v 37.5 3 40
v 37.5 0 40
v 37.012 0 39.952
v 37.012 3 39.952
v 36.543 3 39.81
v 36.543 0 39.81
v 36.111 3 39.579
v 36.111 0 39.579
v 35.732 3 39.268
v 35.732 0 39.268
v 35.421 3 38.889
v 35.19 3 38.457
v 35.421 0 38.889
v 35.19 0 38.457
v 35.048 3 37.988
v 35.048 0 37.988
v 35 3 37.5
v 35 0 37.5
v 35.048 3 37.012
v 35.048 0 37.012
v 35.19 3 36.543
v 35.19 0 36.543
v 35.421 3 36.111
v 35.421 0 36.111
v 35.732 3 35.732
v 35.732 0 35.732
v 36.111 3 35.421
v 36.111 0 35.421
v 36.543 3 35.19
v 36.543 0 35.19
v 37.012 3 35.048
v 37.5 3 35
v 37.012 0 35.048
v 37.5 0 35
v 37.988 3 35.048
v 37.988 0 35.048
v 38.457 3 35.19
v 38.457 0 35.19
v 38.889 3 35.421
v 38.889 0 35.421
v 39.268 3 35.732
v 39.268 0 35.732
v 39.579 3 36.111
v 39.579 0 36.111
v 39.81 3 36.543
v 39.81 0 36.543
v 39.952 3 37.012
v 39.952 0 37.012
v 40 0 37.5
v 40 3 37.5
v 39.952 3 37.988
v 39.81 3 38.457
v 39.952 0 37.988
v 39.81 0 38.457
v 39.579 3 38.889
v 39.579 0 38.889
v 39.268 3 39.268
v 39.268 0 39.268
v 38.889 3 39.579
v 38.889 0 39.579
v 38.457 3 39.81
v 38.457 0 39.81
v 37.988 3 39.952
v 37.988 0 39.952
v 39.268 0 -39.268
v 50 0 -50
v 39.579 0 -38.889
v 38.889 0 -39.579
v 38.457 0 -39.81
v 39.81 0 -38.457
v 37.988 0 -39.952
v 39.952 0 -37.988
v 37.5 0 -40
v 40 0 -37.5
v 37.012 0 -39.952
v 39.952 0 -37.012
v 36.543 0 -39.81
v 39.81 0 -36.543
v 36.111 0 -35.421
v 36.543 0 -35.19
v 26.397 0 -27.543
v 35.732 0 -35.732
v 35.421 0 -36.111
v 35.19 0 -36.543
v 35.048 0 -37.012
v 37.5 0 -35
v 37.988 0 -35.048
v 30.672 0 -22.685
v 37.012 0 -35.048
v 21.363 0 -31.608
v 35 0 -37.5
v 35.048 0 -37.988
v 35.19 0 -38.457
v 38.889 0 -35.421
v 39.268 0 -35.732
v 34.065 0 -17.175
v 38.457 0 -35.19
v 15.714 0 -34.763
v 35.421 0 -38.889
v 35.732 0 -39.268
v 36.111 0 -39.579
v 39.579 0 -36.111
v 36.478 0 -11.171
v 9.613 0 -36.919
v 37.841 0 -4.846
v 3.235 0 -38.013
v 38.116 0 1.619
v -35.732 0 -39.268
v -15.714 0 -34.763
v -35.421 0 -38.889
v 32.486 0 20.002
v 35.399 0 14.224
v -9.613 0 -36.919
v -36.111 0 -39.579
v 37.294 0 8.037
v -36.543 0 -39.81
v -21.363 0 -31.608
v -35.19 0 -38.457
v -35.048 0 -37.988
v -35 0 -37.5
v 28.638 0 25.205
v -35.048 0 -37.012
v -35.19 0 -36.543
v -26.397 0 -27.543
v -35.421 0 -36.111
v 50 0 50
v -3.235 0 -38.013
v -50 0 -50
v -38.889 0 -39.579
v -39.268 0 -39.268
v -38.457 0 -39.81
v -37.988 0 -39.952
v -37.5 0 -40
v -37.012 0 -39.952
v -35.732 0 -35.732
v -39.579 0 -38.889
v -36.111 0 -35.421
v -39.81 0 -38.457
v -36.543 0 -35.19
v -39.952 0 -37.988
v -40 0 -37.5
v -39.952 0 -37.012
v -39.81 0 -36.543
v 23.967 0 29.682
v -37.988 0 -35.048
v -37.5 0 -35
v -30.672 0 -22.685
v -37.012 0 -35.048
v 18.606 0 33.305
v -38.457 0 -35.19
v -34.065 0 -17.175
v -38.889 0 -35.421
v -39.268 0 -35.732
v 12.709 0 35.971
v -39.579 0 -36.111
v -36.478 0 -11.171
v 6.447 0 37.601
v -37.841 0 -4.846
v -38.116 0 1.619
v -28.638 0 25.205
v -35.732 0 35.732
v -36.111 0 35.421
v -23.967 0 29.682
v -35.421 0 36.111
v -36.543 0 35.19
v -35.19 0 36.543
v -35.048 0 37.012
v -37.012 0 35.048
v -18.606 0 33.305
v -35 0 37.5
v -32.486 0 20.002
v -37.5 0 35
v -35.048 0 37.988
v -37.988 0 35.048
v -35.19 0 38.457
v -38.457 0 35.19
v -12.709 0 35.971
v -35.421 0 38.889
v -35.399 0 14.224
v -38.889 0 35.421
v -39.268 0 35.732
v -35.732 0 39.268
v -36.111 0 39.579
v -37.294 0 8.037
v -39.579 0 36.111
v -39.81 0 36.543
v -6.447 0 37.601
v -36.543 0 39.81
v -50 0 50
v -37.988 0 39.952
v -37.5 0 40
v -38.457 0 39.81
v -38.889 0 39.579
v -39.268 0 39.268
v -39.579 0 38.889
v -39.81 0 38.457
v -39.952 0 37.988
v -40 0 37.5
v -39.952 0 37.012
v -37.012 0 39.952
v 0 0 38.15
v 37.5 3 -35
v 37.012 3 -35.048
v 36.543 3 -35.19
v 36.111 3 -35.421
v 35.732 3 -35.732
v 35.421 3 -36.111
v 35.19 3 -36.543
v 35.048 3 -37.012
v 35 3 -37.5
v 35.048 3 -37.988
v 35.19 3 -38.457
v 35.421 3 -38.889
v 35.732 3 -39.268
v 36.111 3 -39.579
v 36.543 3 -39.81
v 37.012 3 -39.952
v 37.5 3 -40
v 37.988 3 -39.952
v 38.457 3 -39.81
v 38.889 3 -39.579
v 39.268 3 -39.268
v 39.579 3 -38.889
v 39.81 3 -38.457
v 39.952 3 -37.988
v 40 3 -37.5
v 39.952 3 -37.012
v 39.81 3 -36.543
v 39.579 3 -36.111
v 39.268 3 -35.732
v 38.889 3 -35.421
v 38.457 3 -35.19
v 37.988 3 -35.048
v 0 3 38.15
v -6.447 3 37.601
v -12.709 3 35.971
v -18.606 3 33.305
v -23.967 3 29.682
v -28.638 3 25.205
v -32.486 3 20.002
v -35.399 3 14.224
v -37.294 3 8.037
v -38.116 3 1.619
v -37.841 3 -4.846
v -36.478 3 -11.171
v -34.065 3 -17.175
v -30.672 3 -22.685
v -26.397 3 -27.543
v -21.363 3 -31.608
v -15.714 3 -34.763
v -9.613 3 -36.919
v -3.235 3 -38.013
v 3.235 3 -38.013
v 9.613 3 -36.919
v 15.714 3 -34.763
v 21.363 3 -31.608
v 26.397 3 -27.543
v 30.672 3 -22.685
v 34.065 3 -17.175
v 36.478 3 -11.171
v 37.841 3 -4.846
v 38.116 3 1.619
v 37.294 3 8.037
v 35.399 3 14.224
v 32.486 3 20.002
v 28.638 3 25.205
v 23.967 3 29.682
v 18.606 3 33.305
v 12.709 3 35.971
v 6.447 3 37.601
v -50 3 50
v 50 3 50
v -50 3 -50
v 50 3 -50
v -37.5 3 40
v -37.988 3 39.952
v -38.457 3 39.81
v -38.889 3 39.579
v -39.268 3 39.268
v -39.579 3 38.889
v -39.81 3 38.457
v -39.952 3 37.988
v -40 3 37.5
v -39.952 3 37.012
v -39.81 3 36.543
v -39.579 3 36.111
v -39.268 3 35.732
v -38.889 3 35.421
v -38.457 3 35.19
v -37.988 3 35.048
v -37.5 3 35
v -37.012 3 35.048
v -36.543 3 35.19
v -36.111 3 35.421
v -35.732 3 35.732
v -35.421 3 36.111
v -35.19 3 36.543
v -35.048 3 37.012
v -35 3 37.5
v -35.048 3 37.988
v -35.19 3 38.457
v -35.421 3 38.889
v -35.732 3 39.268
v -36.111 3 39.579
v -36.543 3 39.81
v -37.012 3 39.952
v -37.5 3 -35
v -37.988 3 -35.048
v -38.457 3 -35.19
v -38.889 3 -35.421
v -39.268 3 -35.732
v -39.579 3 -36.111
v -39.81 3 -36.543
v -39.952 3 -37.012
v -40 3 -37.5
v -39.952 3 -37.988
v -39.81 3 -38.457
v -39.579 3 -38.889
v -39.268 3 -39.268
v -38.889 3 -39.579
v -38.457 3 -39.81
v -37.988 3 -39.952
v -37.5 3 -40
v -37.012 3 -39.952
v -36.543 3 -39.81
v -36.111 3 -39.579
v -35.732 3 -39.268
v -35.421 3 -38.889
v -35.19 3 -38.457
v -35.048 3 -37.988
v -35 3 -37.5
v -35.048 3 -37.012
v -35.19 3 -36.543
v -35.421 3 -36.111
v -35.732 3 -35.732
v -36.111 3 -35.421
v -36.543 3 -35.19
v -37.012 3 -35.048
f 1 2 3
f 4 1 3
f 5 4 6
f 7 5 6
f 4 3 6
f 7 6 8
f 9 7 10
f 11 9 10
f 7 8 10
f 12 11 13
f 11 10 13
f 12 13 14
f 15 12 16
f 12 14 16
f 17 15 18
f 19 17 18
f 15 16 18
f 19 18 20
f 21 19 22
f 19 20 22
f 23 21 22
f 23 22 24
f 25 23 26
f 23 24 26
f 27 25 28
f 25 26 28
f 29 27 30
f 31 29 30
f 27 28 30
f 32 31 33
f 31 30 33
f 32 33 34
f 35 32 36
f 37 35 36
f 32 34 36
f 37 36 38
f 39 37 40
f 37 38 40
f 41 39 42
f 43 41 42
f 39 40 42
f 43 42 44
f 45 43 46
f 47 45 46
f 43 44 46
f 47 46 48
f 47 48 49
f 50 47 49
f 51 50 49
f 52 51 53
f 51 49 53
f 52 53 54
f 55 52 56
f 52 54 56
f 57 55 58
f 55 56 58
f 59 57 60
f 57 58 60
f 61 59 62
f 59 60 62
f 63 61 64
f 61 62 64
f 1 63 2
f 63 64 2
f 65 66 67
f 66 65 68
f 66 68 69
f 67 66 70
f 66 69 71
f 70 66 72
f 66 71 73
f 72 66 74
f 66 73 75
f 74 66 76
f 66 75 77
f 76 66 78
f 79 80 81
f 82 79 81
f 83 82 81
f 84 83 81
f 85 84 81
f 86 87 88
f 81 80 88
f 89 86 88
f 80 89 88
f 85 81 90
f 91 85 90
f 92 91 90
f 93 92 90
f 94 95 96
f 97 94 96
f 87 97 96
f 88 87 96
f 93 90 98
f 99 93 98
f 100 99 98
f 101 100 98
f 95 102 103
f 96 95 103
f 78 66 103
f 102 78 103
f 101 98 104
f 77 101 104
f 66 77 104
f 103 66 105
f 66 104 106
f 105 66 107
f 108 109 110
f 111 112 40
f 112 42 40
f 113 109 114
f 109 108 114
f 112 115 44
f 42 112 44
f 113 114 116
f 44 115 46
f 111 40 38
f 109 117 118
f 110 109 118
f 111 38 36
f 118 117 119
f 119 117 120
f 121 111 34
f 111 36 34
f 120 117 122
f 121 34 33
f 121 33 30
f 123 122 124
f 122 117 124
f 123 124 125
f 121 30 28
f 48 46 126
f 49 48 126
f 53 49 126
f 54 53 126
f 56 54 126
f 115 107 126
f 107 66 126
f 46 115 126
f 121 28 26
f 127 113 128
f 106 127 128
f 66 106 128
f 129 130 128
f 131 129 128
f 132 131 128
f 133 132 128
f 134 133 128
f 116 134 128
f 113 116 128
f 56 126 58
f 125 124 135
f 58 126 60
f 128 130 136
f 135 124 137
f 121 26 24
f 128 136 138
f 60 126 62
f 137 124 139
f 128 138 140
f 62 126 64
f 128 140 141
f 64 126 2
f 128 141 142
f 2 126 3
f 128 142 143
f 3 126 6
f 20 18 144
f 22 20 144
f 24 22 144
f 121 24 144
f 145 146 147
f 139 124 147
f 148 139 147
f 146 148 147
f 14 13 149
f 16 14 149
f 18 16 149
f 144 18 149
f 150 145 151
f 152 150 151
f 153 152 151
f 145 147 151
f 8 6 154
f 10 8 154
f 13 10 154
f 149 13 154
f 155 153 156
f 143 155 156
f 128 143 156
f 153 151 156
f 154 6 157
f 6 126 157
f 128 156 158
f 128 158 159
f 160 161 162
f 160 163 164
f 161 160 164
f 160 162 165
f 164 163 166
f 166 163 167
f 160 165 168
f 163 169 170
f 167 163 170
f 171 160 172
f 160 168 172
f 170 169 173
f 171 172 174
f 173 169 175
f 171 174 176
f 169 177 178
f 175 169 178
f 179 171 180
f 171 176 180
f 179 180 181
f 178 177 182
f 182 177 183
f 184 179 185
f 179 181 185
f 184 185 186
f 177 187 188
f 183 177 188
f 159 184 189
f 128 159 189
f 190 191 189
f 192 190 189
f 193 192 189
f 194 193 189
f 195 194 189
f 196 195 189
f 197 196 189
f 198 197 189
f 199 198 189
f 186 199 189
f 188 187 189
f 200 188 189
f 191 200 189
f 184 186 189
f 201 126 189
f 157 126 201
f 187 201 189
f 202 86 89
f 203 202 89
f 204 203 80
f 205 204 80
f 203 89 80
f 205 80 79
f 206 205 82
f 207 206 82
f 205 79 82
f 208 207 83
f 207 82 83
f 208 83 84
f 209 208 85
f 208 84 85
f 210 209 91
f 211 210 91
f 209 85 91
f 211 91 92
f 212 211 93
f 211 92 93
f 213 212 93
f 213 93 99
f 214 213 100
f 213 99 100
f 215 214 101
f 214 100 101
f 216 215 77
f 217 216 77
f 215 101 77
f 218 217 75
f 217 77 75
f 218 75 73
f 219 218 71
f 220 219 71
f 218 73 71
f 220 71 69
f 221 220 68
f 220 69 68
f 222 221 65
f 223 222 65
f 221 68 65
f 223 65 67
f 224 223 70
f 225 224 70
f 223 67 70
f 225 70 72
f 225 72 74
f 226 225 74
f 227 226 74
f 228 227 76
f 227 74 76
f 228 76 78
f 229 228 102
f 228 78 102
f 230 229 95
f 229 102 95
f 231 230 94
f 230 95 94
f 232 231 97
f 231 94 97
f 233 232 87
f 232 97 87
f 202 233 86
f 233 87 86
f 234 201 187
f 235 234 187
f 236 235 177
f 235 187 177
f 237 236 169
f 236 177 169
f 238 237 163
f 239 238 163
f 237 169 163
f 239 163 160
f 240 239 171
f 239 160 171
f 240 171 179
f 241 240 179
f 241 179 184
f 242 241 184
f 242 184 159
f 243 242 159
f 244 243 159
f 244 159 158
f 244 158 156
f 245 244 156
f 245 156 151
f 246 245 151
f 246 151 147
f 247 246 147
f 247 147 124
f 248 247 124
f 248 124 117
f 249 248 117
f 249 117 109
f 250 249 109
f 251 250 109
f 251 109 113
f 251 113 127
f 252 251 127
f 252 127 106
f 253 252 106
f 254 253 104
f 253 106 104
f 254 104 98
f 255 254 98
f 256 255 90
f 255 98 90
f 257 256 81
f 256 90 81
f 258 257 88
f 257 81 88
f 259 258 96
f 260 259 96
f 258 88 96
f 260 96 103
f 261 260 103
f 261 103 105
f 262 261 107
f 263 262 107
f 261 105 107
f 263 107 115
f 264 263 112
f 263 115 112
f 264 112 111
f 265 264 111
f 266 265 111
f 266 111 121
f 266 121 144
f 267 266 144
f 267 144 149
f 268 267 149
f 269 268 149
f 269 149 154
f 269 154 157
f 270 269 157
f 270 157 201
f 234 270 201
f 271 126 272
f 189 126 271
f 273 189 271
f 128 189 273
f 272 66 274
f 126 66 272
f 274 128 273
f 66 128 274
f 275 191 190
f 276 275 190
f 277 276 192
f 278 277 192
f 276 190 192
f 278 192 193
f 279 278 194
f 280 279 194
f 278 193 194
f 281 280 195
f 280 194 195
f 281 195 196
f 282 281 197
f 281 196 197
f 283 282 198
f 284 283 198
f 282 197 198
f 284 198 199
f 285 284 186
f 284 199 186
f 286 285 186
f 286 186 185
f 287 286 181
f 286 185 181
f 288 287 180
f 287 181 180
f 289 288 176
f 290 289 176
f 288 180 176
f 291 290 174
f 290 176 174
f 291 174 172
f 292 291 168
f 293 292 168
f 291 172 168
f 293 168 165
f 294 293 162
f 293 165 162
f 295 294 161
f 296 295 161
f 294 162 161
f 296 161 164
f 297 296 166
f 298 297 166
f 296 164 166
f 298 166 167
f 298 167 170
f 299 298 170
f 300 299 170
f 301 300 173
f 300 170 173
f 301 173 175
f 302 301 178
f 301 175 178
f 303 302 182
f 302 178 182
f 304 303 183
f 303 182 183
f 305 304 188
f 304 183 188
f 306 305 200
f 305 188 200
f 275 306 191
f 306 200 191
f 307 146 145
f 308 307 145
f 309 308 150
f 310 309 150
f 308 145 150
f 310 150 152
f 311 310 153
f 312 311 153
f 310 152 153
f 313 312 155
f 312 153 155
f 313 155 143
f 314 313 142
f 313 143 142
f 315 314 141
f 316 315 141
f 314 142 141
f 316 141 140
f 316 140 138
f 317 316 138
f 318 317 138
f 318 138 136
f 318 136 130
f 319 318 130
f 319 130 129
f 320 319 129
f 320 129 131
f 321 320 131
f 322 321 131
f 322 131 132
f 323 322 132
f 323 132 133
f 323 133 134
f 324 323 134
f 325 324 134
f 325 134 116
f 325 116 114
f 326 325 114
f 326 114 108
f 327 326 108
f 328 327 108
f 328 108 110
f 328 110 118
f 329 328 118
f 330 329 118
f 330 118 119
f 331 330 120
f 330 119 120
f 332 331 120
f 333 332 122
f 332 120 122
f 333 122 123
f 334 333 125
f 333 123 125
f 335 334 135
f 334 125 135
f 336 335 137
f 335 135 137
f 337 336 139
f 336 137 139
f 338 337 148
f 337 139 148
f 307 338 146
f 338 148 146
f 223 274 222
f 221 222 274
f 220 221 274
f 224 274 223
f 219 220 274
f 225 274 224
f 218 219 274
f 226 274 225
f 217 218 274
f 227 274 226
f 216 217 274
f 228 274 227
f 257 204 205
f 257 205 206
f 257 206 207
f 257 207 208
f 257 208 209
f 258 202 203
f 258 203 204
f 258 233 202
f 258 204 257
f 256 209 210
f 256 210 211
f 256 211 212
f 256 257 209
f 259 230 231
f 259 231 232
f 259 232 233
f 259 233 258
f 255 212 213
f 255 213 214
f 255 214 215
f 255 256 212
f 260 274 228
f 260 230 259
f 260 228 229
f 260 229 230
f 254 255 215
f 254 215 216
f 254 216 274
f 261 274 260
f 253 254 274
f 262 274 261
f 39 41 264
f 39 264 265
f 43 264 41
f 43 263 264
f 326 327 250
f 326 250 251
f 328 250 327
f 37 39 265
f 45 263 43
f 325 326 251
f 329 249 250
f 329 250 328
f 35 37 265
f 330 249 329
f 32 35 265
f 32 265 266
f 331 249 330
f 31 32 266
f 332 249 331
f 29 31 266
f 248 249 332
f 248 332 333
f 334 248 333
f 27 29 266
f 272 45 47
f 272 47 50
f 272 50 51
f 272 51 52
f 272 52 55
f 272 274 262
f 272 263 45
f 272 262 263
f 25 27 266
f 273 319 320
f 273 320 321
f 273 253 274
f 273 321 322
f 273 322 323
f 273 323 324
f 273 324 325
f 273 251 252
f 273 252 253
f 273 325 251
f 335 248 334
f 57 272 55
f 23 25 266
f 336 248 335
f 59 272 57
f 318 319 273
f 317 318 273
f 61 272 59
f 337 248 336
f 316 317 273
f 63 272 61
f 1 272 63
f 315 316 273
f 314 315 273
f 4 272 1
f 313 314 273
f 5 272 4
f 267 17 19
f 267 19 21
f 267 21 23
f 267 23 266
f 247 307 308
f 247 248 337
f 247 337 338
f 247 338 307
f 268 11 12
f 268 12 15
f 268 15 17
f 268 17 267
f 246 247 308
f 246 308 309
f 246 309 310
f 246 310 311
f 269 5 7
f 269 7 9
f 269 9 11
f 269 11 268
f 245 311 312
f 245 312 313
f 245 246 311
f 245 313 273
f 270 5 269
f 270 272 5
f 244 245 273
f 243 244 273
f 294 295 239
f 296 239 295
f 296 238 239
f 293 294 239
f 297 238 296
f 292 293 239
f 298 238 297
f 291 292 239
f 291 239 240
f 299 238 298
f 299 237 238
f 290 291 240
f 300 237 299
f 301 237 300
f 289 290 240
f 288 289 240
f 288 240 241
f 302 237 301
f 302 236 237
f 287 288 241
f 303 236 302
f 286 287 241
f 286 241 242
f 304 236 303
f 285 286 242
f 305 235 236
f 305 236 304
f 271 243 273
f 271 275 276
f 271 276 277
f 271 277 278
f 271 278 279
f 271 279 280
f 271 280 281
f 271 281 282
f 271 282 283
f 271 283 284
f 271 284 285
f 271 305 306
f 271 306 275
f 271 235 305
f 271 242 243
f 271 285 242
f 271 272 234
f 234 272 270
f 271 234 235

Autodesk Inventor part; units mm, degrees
ref_plane "YZ Plane" through (0, 0, 0) normal (1, 0, 0) x (0, 1, 0)
ref_plane "XZ Plane" through (0, 0, 0) normal (0, 1, 0) x (-1, 0, 0)
ref_plane "XY Plane" through (0, 0, 0) normal (0, 0, 1) x (1, 0, 0)
sketch "Sketch1" plane through (0, 0, 0) normal (0, 1, 0) x (-1, 0, 0)
  line L0 (-50, 50) -> (50, 50)
  line L1 (50, 50) -> (50, -50)
  line L2 (50, -50) -> (-50, -50)
  line L3 (-50, -50) -> (-50, 50)
  line L4 (-50, 50) -> (50, -50) construction
  line L5 (50, 50) -> (-50, -50) construction
  point P0 (0, 0)
  dimension "d0" = 100
  dimension "d1" = 100
extrude "Extrusion1" add sketch "Sketch1" along normal blind 3
sketch "Sketch2" plane through (0, 3, 0) normal (0, 1, 0) x (1, 0, 0)
  point P0 (0, 0)
  point P1 (0, 0)
hole "Hole1" at (0, 3, 0) direction (0, -1, 0) diameter 76.3 end through all
sketch "Sketch3" plane through (0, 3, 0) normal (0, 1, 0) x (1, 0, 0)
  line L0 (-50, -50) -> (50, -50) projected
  line L1 (-50, 50) -> (-50, -50) projected
  point P0 (0, 0)
  point P1 (-37.5, -37.5)
  point P2 (37.5, -37.5)
  point P3 (0, 0)
  point P4 (37.5, 37.5)
  point P5 (0, 0)
  point P6 (-37.5, 37.5)
  point P7 (0, 0)
  dimension "d18" = 12.5
  dimension "d19" = 12.5
  dimension "d22" = 360
hole "Hole2" at (-37.5, 3, 37.5) at (-37.5, 3, -37.5) at (37.5, 3, -37.5) at (37.5, 3, 37.5) direction (0, -1, 0) diameter 5 end through all
properties part number "Plant Panel" material "Aluminum 6061"
